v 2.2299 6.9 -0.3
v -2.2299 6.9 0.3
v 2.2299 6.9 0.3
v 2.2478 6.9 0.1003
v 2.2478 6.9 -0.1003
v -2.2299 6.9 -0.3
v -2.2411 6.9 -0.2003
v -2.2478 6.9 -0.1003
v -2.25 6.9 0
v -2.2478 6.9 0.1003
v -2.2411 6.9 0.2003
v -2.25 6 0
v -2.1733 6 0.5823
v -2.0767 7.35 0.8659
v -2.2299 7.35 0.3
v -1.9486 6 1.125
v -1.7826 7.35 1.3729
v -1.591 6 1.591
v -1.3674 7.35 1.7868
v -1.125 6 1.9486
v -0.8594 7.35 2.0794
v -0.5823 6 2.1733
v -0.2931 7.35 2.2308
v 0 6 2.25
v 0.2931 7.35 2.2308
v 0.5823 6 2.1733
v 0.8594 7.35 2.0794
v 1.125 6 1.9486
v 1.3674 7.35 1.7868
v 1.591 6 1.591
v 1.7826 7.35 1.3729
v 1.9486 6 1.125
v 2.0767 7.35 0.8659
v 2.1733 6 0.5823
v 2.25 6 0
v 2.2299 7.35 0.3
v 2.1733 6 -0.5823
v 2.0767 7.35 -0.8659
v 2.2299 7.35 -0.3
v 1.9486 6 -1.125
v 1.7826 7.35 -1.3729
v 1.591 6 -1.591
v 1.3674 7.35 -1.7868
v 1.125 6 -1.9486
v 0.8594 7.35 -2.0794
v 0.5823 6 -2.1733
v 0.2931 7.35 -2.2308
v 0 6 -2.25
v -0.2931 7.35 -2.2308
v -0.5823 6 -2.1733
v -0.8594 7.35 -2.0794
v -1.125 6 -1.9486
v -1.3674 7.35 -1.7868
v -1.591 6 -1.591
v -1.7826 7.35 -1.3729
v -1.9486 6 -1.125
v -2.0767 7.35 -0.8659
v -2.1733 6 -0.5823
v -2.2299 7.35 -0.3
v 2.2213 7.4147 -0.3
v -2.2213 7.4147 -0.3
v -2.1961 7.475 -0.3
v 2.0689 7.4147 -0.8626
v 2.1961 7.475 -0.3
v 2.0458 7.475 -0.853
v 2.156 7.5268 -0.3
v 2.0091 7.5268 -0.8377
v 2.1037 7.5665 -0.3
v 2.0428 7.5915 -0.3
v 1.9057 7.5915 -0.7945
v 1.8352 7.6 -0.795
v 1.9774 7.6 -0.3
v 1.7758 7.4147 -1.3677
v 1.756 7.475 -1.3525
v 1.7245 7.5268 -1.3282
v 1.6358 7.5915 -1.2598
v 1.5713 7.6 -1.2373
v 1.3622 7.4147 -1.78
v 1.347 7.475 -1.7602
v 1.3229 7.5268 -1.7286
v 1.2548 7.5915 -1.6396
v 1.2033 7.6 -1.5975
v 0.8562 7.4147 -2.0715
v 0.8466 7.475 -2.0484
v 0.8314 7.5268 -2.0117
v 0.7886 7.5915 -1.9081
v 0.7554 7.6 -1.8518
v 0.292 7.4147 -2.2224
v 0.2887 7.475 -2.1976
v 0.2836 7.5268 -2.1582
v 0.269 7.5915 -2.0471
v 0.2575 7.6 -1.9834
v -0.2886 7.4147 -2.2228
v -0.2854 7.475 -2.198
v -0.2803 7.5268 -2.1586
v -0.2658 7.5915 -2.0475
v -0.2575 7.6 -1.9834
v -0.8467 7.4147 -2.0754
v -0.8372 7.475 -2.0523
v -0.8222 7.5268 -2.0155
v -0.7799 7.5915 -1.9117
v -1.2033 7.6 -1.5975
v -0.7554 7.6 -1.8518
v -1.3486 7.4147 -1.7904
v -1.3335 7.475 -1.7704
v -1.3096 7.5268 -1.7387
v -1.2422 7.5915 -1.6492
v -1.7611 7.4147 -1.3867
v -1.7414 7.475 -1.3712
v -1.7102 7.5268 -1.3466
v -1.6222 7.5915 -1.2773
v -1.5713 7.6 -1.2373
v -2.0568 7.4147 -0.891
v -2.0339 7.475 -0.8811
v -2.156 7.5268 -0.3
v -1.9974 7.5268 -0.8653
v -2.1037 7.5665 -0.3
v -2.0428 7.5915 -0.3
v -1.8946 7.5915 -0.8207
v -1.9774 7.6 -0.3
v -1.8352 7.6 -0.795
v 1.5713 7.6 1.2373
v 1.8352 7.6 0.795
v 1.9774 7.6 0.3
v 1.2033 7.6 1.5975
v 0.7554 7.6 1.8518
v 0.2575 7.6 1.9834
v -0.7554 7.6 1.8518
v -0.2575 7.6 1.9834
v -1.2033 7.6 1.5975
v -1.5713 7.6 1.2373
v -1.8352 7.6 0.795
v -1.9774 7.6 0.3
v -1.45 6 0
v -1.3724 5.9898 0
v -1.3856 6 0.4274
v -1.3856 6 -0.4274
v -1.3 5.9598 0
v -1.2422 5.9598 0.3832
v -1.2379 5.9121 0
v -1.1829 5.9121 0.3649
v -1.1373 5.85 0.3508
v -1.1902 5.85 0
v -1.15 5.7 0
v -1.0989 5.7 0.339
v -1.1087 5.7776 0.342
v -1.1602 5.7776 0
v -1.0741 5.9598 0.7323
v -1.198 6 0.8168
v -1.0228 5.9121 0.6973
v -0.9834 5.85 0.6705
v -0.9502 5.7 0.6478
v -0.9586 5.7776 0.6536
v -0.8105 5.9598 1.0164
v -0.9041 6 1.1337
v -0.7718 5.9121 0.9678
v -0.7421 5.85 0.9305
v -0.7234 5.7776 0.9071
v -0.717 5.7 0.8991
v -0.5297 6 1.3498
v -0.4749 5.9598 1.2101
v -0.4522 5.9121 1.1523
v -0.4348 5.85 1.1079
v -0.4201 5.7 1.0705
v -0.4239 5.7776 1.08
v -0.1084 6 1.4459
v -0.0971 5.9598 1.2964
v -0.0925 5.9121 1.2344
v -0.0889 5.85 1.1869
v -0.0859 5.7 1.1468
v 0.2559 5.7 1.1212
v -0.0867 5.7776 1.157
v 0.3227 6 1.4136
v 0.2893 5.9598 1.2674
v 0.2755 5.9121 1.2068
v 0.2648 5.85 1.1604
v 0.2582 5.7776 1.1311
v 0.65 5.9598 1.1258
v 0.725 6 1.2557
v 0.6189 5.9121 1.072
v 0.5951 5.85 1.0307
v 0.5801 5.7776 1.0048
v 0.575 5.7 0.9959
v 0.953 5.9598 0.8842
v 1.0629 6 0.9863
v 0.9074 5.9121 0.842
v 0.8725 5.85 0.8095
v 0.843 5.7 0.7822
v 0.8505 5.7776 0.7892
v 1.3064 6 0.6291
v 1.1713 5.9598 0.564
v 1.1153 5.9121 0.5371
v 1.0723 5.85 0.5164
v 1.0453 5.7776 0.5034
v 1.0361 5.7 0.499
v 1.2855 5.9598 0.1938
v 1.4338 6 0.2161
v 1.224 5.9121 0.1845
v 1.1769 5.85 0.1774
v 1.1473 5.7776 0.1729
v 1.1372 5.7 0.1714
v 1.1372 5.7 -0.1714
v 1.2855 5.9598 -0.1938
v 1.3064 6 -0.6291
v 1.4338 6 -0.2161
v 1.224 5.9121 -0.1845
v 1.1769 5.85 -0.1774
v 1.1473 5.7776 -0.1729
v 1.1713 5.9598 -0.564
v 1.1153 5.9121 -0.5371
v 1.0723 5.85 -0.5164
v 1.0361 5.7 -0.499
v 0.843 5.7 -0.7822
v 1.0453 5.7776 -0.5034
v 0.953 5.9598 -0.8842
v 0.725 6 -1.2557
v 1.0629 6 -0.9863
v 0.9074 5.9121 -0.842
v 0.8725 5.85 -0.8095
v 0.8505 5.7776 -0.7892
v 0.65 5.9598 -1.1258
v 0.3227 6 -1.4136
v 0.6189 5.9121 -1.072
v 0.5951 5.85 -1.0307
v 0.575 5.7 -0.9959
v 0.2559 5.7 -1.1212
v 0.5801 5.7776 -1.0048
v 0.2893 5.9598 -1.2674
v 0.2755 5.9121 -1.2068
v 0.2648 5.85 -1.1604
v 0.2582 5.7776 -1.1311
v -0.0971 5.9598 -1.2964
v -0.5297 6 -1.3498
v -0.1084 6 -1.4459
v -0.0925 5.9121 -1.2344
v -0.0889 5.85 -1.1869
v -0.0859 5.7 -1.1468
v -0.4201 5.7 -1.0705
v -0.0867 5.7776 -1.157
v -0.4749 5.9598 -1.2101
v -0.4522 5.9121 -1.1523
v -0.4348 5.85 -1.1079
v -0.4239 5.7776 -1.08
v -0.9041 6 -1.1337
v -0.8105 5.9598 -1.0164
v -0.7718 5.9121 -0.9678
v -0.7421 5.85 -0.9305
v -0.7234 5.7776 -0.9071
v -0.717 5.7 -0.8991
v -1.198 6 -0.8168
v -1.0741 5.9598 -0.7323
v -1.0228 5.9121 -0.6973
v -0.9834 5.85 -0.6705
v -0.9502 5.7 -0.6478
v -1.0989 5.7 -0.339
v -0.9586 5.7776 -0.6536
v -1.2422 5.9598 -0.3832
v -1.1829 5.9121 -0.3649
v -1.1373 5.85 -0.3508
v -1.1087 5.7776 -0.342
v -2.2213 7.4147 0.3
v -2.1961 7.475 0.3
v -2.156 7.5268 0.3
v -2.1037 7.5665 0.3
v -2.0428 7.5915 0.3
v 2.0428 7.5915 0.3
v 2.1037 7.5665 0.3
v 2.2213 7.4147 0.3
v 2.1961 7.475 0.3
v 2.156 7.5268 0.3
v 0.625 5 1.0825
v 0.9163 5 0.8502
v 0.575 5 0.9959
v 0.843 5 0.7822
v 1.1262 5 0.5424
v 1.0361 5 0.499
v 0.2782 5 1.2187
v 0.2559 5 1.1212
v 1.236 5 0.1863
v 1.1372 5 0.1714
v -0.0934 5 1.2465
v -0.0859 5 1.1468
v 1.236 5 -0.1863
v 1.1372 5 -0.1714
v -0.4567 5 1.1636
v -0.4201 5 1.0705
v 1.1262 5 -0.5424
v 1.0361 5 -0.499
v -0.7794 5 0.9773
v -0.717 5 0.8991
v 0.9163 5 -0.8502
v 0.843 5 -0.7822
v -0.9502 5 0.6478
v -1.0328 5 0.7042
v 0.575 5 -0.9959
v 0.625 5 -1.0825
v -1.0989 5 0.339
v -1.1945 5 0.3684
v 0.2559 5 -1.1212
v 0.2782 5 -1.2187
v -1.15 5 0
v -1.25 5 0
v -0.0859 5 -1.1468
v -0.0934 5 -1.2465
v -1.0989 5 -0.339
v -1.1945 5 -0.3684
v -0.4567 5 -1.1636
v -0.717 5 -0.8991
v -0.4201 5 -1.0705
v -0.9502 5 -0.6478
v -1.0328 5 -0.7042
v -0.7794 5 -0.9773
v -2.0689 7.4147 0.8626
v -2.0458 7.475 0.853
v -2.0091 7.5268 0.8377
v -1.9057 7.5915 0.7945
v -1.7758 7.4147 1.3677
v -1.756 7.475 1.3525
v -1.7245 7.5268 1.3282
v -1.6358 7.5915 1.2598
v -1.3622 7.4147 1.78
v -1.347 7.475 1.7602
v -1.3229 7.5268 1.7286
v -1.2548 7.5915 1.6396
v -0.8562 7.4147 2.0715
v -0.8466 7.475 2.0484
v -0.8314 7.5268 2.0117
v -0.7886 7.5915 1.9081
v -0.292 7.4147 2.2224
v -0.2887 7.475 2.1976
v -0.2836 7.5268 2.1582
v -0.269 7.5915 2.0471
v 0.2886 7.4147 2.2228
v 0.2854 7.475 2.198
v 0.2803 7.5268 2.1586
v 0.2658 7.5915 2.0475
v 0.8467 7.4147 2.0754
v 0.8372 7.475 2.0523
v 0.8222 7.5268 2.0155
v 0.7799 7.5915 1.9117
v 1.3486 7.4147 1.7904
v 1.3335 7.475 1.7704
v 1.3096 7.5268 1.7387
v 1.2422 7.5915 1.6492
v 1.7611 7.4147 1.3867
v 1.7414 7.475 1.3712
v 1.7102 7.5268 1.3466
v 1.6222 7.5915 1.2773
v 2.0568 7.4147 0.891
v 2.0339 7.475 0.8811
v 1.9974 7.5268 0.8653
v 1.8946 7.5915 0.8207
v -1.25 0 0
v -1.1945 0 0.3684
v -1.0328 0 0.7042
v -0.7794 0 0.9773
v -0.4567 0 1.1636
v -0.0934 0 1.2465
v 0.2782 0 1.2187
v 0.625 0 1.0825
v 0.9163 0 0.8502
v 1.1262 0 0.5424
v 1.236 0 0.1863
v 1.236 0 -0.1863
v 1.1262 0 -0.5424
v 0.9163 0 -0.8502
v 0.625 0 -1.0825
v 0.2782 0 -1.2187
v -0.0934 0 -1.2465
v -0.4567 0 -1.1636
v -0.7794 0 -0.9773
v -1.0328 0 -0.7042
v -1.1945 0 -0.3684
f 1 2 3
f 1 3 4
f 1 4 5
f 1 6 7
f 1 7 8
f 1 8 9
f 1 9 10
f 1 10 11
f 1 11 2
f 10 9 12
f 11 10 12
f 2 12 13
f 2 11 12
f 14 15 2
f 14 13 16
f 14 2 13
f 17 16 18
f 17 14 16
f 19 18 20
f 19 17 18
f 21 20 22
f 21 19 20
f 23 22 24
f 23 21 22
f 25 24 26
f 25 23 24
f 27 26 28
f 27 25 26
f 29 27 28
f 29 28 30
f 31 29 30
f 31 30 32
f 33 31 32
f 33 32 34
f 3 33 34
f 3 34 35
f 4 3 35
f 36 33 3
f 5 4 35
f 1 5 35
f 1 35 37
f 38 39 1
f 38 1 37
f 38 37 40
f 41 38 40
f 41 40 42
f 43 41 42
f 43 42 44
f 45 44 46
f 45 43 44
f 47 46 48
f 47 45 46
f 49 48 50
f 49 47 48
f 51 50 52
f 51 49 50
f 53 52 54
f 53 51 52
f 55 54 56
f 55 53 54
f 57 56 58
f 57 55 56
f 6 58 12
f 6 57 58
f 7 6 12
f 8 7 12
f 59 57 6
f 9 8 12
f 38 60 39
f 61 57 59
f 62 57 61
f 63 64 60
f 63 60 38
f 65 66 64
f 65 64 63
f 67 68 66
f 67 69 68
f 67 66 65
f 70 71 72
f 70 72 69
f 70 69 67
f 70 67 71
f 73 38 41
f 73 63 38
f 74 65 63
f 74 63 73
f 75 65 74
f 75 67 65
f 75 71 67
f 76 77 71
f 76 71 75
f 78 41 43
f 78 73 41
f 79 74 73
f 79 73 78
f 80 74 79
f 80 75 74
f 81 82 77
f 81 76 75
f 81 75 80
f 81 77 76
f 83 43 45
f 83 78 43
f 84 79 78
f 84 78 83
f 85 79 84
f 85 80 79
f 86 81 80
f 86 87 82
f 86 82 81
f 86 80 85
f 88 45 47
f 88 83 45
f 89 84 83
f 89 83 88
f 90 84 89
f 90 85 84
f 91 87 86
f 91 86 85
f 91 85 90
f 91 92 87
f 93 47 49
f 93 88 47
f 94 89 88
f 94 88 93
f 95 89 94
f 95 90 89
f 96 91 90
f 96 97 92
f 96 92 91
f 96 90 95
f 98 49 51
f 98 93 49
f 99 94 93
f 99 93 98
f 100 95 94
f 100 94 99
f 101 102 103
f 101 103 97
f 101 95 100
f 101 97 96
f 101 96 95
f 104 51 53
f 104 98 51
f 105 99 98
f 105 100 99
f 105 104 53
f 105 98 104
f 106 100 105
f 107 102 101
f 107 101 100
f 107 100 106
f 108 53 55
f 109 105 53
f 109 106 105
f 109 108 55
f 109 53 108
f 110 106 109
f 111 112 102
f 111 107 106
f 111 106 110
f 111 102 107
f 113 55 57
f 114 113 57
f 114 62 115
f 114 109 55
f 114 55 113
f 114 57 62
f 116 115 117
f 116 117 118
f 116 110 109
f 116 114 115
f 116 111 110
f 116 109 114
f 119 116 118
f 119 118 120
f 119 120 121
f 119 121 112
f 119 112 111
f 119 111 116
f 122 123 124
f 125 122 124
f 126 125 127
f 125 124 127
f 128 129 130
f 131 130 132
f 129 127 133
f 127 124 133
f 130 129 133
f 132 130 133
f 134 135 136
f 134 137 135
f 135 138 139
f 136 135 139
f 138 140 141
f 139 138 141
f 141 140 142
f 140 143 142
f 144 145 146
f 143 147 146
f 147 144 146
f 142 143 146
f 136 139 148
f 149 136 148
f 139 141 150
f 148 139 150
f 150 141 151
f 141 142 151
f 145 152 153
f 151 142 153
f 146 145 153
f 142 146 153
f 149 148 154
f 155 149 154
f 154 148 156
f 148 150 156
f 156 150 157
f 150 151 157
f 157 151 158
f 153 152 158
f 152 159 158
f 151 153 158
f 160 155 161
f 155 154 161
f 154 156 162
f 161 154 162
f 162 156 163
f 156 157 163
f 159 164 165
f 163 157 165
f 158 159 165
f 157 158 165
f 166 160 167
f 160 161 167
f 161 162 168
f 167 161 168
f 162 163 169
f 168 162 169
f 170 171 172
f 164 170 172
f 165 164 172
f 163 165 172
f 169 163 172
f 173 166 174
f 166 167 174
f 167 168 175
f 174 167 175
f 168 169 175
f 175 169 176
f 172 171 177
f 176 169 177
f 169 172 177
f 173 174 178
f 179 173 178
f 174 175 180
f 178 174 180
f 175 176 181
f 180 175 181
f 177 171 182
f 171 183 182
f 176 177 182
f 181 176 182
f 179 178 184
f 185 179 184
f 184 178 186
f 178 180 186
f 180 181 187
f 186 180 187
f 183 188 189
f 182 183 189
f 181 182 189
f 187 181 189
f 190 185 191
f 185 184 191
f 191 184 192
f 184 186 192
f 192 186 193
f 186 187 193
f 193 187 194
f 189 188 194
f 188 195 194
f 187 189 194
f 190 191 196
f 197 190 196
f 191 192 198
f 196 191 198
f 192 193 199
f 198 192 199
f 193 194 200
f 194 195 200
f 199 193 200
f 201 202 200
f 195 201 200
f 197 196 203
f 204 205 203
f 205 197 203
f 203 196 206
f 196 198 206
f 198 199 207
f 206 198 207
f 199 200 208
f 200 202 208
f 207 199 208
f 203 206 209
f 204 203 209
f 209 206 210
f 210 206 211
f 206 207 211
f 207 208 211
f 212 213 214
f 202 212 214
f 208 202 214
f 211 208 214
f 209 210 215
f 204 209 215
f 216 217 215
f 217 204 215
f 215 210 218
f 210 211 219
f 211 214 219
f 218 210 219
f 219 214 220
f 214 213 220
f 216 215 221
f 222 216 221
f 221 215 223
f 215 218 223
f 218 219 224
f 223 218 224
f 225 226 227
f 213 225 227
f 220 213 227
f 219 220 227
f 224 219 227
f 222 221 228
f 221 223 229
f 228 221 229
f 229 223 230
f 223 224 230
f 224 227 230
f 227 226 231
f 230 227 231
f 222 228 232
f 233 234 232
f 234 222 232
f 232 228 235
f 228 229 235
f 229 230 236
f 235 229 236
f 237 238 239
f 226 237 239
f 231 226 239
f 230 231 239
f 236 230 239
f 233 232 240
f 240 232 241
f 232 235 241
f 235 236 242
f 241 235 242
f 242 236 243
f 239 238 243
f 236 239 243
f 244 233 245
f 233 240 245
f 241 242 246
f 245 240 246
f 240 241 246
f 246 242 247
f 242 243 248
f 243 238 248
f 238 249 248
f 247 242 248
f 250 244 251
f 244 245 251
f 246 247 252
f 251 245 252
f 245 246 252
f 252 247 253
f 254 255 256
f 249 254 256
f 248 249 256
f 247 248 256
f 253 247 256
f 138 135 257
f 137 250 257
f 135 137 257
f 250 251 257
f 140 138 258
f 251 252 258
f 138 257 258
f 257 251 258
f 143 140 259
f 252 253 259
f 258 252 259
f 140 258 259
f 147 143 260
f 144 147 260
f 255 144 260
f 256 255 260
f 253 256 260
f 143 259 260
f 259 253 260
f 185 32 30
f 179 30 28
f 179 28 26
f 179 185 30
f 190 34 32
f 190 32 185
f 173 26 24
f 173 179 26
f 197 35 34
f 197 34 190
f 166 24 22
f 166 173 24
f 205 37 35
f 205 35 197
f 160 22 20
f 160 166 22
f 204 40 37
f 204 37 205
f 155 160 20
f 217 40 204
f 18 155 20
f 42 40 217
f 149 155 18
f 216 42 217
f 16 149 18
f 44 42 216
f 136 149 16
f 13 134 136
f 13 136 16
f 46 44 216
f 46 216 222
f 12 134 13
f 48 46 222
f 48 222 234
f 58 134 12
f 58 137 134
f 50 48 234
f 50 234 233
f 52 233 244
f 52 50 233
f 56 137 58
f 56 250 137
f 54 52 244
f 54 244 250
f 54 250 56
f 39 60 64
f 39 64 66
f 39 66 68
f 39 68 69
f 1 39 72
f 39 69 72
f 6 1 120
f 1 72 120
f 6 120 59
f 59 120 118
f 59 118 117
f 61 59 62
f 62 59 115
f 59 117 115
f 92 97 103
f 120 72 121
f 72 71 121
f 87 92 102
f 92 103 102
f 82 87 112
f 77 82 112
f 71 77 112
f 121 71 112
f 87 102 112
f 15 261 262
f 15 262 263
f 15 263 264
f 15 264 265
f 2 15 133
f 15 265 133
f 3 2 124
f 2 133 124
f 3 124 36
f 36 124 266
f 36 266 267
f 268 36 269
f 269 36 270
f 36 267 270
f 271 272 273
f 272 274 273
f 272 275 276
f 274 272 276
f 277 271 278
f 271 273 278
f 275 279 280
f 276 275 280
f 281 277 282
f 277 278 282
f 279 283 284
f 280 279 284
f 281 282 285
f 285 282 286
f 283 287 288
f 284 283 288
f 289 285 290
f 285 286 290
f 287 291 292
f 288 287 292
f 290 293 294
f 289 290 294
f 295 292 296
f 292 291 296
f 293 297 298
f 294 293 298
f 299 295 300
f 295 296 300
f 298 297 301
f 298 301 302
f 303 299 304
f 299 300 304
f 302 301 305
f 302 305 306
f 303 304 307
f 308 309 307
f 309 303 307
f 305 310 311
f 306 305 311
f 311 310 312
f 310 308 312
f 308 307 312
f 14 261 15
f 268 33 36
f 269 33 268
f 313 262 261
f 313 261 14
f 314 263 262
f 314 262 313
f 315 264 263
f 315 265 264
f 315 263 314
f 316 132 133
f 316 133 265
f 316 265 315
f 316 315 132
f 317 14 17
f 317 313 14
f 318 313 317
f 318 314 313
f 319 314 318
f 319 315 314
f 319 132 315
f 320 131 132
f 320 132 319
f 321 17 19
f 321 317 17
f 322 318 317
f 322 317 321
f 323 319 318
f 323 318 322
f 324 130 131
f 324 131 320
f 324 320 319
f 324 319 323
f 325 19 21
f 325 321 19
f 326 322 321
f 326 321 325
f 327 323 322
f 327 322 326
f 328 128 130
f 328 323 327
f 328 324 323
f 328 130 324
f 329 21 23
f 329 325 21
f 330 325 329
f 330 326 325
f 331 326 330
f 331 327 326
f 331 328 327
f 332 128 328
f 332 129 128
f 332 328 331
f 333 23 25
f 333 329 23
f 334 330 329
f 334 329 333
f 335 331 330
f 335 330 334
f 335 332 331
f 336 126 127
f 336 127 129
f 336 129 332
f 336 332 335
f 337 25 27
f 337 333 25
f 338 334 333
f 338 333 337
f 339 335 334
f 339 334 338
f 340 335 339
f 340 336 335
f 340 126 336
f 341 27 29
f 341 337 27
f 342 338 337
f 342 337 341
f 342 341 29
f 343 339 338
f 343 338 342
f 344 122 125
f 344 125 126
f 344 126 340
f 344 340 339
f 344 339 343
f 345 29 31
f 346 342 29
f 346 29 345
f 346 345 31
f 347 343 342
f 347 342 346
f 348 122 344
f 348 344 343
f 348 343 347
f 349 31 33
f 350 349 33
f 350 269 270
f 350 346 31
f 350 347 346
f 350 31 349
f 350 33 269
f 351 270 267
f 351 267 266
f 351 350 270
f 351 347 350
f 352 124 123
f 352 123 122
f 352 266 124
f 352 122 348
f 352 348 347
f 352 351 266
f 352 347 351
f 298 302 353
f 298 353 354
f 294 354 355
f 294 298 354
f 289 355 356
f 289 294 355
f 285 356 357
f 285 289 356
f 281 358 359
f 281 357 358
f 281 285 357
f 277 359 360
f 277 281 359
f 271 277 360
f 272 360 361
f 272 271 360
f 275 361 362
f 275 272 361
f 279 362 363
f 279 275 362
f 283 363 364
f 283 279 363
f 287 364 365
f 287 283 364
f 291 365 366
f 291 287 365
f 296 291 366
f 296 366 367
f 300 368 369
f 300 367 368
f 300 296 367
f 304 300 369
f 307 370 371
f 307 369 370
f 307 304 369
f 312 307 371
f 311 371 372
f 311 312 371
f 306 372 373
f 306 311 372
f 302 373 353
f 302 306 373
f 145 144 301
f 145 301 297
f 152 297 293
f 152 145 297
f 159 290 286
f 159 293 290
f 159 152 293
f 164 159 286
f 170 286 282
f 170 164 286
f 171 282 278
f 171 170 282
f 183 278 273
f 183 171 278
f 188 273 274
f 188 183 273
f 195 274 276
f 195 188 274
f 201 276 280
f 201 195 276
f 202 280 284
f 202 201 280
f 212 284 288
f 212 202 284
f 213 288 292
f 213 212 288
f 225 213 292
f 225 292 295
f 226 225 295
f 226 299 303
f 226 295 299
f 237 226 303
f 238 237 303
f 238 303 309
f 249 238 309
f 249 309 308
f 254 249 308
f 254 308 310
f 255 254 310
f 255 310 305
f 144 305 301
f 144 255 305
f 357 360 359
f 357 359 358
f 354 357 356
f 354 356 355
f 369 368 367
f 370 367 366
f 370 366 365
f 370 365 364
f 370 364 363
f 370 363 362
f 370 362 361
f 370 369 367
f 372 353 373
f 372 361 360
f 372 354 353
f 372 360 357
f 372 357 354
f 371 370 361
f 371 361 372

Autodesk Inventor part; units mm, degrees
ref_plane "YZ Plane" through (0, 0, 0) normal (1, 0, 0) x (0, 1, 0)
ref_plane "XZ Plane" through (0, 0, 0) normal (0, 1, 0) x (-1, 0, 0)
ref_plane "XY Plane" through (0, 0, 0) normal (0, 0, 1) x (1, 0, 0)
sketch "Sketch1" plane through (0, 0, 0) normal (0, 0, 1) x (1, 0, 0)
  line L0 (0, 0) -> (-1.25, 0)
  line L1 (-1.25, 0) -> (-1.25, 5)
  line L2 (-1.25, 5) -> (-1.15, 5)
  line L3 (-1.15, 5) -> (-1.15, 6)
  line L4 (-1.15, 6) -> (-2.25, 6)
  line L5 (-2.25, 6) -> (-2.25, 7.6)
  line L6 (-2.25, 7.6) -> (0, 7.6)
  line L7 (0, 7.6) -> (0, 0)
  dimension "d0" = 1.6
  dimension "d1" = 2.25
  dimension "d2" = 1.25
  dimension "d3" = 0.1
  dimension "d4" = 1
  dimension "d5" = 7.6
  dimension "d6" = 90
revolve "Revolution1" add sketch "Sketch1" angle 360 about axis through (0, 7.6, 0) along (0, -1, 0)
thread "Thread1" size "M3x0.5" class "6g" standard "ANSI Metric M Profile" length 27
sketch "Sketch2" plane through (0, 7.6, 0) normal (0, 1, 0) x (1, 0, 0)
  line L0 (5, 0.3) -> (-5, 0.3)
  line L1 (-5, 0.3) -> (-5, -0.3)
  line L2 (-5, -0.3) -> (5, -0.3)
  line L3 (5, -0.3) -> (5, 0.3)
  line L4 (5, 0.3) -> (-5, -0.3) construction
  line L5 (-5, 0.3) -> (5, -0.3) construction
  point P0 (0, 0)
  dimension "d10" = 10
  dimension "d11" = 0.6
fillet "Fillet1" radius 0.25 1 edges at (2.25, 7.6, 0)
extrude "Extrusion2" cut sketch "Sketch2" against normal blind 0.7
fillet "Fillet2" radius 0.3 1 edges at (1.15, 6, 0)
properties part number "Screw-CheeseHead-Brass-M2.5x08" material "Brass, Soft Yellow"
